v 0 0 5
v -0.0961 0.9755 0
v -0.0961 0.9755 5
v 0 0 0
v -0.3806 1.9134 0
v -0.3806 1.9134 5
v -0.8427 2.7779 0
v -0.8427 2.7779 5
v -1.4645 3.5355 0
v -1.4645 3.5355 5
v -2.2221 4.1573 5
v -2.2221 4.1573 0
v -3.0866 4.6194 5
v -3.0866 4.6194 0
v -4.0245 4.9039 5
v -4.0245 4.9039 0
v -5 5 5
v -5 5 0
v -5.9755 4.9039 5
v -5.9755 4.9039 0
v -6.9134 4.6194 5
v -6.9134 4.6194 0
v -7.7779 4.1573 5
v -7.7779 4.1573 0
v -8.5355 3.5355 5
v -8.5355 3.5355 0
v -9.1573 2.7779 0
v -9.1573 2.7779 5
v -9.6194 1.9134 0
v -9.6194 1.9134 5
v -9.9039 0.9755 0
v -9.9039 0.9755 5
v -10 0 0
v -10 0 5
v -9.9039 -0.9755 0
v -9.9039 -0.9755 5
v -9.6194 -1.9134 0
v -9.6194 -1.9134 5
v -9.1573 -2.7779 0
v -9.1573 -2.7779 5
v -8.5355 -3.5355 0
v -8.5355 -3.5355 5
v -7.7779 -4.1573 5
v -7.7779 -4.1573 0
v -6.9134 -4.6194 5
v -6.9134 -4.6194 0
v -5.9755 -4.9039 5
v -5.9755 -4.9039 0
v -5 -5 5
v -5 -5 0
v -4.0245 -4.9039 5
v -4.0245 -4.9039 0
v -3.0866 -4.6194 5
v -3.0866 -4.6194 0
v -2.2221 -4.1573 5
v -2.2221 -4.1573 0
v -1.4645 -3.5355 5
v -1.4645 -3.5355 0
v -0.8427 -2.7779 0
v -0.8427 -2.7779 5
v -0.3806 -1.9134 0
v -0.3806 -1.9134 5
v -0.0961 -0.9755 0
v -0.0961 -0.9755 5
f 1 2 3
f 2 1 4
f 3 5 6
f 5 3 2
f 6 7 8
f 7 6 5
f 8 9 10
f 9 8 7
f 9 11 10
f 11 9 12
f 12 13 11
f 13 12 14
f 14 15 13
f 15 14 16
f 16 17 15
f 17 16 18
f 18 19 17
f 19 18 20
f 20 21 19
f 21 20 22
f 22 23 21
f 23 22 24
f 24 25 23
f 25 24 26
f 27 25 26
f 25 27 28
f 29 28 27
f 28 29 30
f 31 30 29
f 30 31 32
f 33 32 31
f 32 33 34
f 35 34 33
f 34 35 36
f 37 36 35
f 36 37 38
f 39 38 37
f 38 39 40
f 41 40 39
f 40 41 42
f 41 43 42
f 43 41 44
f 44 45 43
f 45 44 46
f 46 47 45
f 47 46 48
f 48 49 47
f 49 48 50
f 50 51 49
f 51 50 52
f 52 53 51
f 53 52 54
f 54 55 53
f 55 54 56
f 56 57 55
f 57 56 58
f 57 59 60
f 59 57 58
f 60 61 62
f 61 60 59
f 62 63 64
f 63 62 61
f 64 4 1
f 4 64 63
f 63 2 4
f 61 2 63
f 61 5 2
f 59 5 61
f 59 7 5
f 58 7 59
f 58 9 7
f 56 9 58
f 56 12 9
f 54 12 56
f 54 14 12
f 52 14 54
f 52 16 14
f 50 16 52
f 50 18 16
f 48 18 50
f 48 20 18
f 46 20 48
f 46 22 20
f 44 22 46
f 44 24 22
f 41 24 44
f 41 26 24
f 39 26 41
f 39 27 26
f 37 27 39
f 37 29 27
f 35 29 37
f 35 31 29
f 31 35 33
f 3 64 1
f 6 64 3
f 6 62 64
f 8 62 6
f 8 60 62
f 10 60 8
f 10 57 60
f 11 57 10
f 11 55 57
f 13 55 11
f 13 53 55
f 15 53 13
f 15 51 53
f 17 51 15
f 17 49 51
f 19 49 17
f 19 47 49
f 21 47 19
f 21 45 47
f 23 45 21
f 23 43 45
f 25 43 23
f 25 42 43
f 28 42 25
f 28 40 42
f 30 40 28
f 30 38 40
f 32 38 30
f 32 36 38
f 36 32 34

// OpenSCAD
// Auther: Tobias Grundtvig
// Date: Oct 1, 2020
//
// A wrapper of the build-in cylinder module, to get consistent naming

Cylinder(diameter=10, height=5, t_x="neg", t_z="pos");

module Cylinder(diameter, height, t_x="center", t_y="center", t_z="center", angular_resolution=32)
{
    tx = t_x == "neg" ? -diameter/2 : 
            t_x == "pos" ? diameter/2 : 0;
    ty = t_y == "neg" ? -diameter/2 : 
            t_y == "pos" ? diameter/2 : 0;
    tz = t_z == "neg" ? -height/2 : 
            t_z == "pos" ? height/2 : 0;
    translate([tx,ty,tz])
        cylinder(d=diameter, h=height, center=true, $fn=angular_resolution);
}
